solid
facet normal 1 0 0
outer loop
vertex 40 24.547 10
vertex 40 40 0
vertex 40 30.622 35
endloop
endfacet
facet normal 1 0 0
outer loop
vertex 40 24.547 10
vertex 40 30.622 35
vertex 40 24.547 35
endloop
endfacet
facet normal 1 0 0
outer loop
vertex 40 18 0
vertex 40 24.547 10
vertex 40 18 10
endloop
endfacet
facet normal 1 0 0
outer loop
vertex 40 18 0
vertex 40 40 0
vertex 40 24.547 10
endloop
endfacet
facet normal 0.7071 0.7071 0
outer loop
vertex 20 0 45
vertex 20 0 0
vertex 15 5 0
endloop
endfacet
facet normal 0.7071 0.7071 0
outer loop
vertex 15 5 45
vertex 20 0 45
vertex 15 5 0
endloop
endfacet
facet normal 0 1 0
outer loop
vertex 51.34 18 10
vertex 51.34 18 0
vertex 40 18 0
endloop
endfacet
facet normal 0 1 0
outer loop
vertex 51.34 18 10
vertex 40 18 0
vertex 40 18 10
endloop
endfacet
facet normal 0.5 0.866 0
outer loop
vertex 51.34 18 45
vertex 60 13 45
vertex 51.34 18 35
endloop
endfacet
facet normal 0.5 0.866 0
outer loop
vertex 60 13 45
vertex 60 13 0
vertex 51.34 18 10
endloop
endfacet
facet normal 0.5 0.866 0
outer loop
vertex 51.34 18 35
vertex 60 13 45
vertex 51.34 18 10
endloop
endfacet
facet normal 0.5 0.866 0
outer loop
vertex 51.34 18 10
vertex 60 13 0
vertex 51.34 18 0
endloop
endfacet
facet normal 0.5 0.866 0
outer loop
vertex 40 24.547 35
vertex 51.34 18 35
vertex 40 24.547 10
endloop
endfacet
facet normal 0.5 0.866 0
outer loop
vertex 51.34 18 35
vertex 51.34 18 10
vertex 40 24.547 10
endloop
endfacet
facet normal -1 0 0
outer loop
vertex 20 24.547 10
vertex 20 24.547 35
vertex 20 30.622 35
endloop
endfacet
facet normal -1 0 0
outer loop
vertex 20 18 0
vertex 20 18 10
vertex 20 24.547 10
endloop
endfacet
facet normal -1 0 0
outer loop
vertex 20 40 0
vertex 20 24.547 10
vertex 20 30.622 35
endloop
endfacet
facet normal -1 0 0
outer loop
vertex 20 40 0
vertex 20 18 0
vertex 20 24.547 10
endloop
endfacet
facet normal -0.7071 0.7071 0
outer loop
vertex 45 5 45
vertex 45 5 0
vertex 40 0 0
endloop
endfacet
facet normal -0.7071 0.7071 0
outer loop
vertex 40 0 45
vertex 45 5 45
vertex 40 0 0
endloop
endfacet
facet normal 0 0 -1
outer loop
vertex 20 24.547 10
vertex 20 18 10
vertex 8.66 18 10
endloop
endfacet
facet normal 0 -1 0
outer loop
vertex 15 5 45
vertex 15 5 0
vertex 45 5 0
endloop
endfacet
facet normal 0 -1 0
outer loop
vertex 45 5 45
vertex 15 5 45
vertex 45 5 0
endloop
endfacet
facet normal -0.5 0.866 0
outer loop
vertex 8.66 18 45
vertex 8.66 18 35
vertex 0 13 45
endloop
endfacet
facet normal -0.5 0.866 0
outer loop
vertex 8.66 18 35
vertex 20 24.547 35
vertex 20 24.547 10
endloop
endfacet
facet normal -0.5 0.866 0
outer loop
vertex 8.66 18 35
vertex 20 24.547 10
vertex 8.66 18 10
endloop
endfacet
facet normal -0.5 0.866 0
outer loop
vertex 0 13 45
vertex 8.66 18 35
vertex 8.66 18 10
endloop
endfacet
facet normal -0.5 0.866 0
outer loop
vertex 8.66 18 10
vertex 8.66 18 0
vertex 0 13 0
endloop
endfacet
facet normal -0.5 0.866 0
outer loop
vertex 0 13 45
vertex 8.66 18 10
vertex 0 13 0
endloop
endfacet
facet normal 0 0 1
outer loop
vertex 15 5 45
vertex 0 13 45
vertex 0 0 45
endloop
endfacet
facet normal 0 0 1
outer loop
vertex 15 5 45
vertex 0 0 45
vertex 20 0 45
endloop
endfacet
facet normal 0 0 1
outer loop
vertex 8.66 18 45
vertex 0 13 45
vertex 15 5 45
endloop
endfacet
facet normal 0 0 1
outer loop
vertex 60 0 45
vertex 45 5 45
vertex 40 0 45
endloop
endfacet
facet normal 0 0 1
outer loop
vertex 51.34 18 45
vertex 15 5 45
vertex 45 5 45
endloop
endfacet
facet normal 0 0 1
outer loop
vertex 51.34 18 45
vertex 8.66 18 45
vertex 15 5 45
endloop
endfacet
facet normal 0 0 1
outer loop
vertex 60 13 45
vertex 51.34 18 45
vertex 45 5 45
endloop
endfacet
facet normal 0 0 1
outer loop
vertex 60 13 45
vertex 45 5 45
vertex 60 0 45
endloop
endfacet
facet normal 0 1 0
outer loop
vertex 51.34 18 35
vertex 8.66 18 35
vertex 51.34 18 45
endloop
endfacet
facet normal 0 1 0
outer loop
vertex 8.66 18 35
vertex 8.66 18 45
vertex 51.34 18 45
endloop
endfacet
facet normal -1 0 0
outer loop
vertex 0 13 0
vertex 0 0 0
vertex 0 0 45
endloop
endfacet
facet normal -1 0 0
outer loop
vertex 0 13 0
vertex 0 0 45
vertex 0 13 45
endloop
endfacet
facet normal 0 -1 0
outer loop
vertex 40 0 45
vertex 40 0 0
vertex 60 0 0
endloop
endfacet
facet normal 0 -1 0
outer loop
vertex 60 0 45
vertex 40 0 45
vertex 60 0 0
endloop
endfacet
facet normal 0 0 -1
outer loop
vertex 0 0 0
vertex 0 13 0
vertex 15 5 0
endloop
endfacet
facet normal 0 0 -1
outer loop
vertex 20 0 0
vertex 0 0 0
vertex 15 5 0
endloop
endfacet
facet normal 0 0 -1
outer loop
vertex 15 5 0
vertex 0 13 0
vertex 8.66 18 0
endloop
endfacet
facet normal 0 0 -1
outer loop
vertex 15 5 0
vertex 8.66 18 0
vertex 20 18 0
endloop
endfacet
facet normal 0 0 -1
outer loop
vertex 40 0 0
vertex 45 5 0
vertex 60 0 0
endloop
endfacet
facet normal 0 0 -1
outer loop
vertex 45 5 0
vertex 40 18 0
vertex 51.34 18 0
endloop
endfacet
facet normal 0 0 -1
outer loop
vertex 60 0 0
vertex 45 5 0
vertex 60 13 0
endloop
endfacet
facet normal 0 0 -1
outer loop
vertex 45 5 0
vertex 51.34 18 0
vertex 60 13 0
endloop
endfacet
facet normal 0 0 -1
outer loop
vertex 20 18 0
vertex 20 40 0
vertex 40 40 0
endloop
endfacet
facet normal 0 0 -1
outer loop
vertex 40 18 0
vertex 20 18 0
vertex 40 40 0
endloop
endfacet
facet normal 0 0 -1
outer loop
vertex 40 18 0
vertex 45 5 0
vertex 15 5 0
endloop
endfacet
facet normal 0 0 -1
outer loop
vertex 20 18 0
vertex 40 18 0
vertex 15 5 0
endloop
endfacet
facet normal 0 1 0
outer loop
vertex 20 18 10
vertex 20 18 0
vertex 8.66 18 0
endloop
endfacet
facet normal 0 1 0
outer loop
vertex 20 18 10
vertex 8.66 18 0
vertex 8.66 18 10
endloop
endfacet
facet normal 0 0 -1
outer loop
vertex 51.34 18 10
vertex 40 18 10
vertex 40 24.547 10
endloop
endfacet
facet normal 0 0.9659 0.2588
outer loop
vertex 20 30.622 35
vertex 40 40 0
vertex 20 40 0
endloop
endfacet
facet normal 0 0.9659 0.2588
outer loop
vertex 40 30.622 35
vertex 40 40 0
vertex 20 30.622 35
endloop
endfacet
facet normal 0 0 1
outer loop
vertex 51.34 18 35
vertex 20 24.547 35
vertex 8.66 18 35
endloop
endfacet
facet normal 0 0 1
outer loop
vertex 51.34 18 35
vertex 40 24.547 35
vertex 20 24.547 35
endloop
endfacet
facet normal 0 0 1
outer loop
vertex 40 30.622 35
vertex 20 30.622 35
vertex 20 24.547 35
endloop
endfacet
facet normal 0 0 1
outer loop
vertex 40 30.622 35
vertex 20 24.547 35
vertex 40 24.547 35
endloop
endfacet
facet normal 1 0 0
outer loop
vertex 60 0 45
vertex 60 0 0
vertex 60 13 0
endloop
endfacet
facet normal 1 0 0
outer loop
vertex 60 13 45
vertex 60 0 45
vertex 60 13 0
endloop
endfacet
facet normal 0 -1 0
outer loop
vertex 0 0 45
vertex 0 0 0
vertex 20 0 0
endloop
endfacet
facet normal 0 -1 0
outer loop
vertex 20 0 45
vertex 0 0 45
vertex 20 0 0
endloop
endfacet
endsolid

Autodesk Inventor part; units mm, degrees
ref_plane "YZ Plane" through (0, 0, 0) normal (1, 0, 0) x (0, 1, 0)
ref_plane "XZ Plane" through (0, 0, 0) normal (0, 1, 0) x (-1, 0, 0)
ref_plane "XY Plane" through (0, 0, 0) normal (0, 0, 1) x (1, 0, 0)
sketch "Sketch1" plane through (0, 0, 0) normal (0, 0, 1) x (1, 0, 0)
  line L0 (0, 0) -> (20, 0)
  line L1 (20, 0) -> (15, 5)
  line L2 (15, 5) -> (45, 5)
  line L3 (45, 5) -> (40, 0)
  line L4 (40, 0) -> (60, 0)
  line L5 (60, 0) -> (60, 13)
  line L6 (0, 0) -> (0, 13)
  line L7 (20, 24.547) -> (20, 40)
  line L8 (20, 40) -> (40, 40)
  line L9 (40, 40) -> (40, 24.547)
  line L10 (60, 13) -> (40, 24.547)
  line L11 (20, 24.547) -> (0, 13)
extrude "Extrusion1" add sketch "Sketch1" along normal blind 45
sketch "Sketch2" plane through (0, 0, 45) normal (0, 0, 1) x (1, 0, 0)
  line L0 (20, 24.547) -> (0, 13) projected
  line L1 (8.6603, 18) -> (51.3397, 18)
  line L2 (60, 13) -> (40, 24.547) projected
  line L3 (8.6603, 18) -> (20, 24.547)
  line L4 (20, 40) -> (20, 24.547) projected
  line L5 (20, 24.547) -> (20, 40)
  line L6 (20, 40) -> (40, 40)
  line L7 (40, 40) -> (40, 24.547)
  line L8 (40, 24.547) -> (40, 40) projected
  line L9 (40, 24.547) -> (51.3397, 18)
  point P0 (0, 0)
extrude "Extrusion2" cut sketch "Sketch2" against normal blind 10
sketch "Sketch3" plane through (40, 24.547, 0) normal (1, 0, 0) x (0, 0, -1)
  line L0 (0, 0) -> (0, 15.453) projected
  line L1 (0, 15.453) -> (37.2699, 15.453) construction
  line L2 (-35, 0) -> (-35, 15.453) projected
  line L3 (-35, 15.453) -> (0, 15.453)
  line L4 (0, 15.453) -> (-35, 6.0748)
  line L5 (-35, 6.0748) -> (-35, 15.453)
  point P0 (0, -24.547)
extrude "Extrusion3" cut sketch "Sketch3" against normal blind 20
sketch "Sketch4" plane through (60, 0, 0) normal (1, 0, 0) x (0, 0, -1)
  line L0 (0, 18) -> (-10, 18)
  line L1 (-10, 18) -> (-10, 24.547)
  line L2 (0, 24.547) -> (-35, 24.547) projected
  line L3 (0, 24.547) -> (0, 40) projected
  line L4 (-10, 24.547) -> (0, 24.547)
  line L5 (0, 24.547) -> (0, 18)
  point P0 (0, 0)
extrude "Extrusion4" cut sketch "Sketch4" against normal blind 20
sketch "Sketch5" plane through (0, 0, 0) normal (-1, 0, 0) x (0, 0, 1)
  line L0 (10, 18) -> (10, 24.547) projected
  line L1 (10, 18) -> (10, 24.547)
  line L2 (0, 24.547) -> (35, 24.547) projected
  line L3 (10, 24.547) -> (0, 24.547)
  line L4 (0, 24.547) -> (0, 18)
  line L5 (0, 24.547) -> (0, 13) projected
  line L6 (0, 18) -> (10, 18) projected
  line L7 (10, 18) -> (0, 18)
  point P0 (0, 0)
extrude "Extrusion5" cut sketch "Sketch5" against normal blind 20
properties part number "P3-15"
